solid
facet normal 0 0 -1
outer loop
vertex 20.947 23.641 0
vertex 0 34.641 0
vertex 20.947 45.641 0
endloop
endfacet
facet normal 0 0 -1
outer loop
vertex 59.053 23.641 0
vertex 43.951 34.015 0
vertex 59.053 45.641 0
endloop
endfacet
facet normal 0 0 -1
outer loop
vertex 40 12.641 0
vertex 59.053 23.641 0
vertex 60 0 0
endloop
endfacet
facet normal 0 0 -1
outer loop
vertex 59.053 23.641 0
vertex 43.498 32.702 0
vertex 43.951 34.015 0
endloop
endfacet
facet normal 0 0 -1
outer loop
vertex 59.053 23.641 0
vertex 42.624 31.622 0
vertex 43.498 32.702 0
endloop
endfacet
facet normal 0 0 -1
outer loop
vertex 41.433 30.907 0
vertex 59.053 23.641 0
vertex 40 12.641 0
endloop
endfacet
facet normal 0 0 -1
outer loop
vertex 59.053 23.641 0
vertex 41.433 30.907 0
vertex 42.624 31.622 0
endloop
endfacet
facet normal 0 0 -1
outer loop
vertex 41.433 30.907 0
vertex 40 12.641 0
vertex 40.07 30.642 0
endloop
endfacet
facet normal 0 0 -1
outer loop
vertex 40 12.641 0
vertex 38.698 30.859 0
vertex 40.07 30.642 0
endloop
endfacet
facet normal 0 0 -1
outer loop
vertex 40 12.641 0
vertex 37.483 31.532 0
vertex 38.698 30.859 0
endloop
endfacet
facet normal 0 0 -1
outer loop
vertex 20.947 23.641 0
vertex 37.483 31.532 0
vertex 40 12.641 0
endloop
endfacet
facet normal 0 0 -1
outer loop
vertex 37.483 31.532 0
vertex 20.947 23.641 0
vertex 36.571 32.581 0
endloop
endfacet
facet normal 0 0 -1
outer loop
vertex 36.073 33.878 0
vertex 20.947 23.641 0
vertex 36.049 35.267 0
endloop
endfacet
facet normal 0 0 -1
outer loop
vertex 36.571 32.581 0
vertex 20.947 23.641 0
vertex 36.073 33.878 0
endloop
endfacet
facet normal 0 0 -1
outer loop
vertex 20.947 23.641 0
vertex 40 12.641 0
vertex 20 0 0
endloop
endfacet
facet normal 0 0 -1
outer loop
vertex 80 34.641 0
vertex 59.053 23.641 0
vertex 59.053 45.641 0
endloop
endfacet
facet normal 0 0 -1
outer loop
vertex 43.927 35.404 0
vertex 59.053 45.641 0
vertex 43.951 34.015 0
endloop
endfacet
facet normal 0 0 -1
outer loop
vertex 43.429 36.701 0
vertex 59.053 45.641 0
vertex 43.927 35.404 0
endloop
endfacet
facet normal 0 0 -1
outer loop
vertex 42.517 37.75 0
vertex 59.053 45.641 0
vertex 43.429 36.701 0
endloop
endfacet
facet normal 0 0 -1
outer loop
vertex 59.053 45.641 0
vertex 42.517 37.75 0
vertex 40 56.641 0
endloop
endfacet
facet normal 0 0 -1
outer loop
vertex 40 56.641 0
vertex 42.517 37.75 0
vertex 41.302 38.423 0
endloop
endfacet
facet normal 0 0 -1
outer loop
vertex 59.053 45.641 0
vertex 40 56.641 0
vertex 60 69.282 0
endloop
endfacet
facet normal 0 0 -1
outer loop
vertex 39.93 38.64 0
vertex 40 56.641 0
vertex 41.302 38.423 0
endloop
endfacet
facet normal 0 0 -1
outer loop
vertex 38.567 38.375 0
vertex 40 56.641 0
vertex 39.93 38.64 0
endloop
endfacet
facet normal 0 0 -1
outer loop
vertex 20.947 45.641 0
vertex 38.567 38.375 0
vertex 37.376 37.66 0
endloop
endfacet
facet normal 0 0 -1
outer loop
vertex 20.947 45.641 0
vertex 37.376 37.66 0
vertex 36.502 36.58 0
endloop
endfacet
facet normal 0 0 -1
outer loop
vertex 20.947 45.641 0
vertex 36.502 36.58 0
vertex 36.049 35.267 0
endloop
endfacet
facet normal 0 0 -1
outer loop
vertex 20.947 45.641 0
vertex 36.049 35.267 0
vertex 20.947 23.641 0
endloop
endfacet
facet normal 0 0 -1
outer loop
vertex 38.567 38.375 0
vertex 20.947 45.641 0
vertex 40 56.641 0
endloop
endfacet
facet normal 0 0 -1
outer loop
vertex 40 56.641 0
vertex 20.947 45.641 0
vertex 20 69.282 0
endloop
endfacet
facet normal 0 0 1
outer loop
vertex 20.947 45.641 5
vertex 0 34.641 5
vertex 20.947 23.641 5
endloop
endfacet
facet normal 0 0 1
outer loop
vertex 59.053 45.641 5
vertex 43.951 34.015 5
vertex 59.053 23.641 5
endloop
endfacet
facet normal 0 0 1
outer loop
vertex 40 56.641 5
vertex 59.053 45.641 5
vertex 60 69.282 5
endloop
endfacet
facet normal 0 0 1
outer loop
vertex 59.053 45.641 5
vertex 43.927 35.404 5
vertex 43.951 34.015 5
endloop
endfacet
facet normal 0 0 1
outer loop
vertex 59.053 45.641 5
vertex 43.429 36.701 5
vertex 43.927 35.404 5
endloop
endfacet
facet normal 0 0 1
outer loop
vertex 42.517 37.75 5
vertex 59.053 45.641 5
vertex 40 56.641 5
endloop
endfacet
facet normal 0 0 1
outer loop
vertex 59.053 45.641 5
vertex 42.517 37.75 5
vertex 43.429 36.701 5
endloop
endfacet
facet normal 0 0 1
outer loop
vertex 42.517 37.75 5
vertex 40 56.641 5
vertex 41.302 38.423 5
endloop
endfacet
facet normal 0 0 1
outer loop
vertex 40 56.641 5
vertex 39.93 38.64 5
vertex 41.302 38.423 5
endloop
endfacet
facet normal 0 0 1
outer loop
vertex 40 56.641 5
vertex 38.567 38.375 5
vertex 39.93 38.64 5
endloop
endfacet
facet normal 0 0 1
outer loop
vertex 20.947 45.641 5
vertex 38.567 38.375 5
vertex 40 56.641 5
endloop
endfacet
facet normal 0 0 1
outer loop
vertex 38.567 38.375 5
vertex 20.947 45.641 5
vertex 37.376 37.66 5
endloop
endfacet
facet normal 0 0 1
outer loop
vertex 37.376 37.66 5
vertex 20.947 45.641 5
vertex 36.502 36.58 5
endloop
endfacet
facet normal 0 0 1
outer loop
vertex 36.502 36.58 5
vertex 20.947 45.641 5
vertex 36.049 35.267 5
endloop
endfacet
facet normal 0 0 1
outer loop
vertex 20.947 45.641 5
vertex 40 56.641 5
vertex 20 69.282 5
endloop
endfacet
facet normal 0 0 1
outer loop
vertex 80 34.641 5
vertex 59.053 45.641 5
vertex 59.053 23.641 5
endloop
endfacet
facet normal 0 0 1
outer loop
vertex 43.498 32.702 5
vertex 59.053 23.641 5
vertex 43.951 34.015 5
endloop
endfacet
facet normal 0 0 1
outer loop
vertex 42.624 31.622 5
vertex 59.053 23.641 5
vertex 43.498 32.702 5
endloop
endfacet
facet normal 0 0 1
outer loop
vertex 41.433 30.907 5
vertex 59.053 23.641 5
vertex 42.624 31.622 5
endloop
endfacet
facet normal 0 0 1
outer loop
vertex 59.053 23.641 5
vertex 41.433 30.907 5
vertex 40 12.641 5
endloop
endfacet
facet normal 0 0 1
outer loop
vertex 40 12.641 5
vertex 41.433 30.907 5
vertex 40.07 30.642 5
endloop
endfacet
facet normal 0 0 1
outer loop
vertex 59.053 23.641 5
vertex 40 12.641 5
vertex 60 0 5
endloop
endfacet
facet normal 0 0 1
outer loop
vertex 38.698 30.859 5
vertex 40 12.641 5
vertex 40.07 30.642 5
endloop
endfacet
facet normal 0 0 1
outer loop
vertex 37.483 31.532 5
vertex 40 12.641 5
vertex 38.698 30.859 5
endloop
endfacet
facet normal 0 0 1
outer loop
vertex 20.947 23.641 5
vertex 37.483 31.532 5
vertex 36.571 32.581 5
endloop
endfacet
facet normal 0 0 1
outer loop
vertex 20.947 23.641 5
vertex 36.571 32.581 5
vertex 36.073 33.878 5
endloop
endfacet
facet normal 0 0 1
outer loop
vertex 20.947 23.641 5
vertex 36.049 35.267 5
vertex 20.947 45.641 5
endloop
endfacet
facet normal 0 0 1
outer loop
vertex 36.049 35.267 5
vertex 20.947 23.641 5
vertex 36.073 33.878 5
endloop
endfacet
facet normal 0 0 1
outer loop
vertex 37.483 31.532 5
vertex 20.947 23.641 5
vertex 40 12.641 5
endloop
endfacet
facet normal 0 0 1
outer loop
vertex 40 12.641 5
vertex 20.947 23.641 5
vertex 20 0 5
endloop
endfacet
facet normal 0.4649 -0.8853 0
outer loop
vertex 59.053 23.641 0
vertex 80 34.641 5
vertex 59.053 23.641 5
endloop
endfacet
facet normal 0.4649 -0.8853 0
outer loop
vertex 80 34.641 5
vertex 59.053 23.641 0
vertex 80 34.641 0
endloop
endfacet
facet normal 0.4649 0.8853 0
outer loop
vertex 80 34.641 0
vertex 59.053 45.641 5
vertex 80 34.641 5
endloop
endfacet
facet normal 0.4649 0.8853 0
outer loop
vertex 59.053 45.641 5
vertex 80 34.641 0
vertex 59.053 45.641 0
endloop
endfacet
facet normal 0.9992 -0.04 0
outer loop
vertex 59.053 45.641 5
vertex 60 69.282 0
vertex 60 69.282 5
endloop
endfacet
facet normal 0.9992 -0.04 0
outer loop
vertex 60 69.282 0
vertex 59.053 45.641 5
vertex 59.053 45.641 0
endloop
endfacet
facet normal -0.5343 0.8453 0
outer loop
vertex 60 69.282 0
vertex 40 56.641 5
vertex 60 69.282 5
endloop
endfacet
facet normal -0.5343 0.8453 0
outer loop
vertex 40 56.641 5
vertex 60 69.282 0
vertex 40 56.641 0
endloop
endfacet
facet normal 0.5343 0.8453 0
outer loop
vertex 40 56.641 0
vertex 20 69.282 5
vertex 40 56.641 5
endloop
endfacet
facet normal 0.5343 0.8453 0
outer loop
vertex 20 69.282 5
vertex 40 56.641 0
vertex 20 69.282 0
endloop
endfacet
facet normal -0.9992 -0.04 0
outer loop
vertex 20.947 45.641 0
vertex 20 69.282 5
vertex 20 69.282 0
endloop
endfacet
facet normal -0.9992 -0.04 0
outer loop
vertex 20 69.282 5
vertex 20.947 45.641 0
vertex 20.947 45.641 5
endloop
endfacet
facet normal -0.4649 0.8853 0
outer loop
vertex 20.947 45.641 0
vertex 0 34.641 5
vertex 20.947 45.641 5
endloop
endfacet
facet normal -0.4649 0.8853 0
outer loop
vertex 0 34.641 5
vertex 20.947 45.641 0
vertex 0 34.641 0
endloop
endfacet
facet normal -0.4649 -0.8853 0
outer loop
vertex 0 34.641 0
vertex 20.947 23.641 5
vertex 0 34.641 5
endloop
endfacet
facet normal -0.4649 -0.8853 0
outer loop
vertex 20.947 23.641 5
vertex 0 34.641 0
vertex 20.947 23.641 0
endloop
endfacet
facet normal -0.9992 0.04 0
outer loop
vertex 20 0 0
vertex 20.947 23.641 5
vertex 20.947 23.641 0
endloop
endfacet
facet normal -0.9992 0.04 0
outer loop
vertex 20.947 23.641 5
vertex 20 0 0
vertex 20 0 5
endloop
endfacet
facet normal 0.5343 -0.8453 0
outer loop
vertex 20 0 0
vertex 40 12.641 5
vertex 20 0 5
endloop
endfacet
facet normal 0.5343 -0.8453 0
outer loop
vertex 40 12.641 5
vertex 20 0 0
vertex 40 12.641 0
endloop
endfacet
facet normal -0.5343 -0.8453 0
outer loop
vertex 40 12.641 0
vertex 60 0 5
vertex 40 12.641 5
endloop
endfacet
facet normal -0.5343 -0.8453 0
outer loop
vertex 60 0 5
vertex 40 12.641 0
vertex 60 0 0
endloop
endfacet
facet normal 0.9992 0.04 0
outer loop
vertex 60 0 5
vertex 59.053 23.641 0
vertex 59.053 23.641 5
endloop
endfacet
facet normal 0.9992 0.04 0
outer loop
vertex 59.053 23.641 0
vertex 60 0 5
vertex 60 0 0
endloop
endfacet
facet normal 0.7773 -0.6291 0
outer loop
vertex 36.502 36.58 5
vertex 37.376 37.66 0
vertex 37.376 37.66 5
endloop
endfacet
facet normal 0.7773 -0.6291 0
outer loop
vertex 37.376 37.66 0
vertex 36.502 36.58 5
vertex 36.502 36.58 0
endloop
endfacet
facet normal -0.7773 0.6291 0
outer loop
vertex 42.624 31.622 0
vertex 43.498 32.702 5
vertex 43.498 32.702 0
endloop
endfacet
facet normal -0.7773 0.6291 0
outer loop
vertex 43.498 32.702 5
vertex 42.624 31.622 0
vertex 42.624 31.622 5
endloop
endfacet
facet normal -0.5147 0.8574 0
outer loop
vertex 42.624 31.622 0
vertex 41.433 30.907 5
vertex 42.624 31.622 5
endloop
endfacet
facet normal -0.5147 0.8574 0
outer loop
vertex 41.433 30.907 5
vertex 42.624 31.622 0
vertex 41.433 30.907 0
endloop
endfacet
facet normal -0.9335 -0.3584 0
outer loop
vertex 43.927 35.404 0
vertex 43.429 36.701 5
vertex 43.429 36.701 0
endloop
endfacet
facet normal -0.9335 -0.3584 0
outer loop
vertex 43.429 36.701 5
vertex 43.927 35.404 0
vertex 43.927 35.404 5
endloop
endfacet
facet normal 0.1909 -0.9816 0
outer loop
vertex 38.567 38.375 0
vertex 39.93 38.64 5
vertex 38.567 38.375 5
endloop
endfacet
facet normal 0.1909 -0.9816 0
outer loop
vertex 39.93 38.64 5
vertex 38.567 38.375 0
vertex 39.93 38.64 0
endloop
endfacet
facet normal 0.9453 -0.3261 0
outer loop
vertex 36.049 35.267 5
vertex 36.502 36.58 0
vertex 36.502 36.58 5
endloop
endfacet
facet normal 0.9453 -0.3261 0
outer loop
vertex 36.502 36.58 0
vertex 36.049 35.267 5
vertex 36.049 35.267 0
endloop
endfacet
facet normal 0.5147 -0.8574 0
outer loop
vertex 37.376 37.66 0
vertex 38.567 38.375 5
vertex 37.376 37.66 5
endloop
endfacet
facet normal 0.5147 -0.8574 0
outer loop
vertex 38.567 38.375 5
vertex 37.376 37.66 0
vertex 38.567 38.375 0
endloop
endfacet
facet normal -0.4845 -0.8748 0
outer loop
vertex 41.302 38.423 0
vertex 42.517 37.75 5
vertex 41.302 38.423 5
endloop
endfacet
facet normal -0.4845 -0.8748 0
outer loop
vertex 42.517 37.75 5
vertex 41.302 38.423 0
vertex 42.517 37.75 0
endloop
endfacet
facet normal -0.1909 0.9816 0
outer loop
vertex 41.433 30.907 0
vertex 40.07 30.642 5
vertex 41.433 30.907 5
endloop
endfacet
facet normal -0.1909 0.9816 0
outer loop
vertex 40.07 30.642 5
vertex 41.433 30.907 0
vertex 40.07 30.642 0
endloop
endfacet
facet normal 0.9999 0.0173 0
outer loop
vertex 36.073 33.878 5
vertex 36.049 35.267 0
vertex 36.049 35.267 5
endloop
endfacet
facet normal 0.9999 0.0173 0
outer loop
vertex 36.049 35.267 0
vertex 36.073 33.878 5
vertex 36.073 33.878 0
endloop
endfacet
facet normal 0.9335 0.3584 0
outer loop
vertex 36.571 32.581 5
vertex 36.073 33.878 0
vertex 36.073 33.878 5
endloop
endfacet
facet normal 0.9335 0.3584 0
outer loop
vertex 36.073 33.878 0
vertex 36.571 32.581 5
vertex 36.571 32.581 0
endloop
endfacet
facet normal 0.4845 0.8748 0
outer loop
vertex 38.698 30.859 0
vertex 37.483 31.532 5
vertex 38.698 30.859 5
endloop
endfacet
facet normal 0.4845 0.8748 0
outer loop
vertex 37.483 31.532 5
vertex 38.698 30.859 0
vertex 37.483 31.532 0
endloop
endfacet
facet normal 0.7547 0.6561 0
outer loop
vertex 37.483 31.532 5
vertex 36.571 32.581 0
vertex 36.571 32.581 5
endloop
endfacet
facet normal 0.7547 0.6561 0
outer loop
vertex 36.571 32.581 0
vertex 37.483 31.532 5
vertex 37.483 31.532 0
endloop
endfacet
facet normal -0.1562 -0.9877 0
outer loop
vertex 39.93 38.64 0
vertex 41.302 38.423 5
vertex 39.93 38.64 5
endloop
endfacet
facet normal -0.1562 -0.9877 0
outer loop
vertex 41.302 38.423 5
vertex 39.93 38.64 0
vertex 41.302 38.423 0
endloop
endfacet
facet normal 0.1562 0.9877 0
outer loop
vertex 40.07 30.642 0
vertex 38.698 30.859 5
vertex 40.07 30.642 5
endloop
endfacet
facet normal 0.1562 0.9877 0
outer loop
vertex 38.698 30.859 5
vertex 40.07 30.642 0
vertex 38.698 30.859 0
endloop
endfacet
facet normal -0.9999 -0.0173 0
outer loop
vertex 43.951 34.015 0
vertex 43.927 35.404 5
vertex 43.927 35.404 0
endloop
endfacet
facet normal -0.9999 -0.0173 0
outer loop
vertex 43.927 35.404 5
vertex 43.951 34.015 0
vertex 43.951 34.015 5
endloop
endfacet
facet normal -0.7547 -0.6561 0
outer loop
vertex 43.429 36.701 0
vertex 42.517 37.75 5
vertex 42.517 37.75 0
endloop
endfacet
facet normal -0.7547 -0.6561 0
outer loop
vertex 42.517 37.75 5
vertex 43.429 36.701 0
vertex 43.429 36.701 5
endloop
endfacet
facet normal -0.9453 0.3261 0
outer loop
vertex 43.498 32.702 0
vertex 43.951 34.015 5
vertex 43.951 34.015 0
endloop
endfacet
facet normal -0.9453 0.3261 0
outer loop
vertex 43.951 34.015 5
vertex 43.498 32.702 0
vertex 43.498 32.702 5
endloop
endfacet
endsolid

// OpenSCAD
$fn = 32;

// ----------------------------------------------------------------------
// Star wheel: 6-point star, R40
// ----------------------------------------------------------------------

// --- parameters (mm) ---
n_points = 6;             // number of points / teeth
r_out = 40;               // tip radius
r_in = 22;                // root radius
bore_r = 4;               // centre bore radius
plate_t = 5;              // plate thickness, Z (extrusion height)
bore_d = 8;               // centre bore diameter

profile = [[80, 34.641], [59.053, 45.641], [60, 69.282], [40, 56.641], [20, 69.282], [20.947, 45.641], [0, 34.641], [20.947, 23.641], [20, 0], [40, 12.641], [60, 0], [59.053, 23.641]];  // primary outline, 12 points, counter clockwise
void_1 = [[43.927, 35.404], [43.429, 36.701], [42.517, 37.75], [41.302, 38.423], [39.93, 38.64], [38.567, 38.375], [37.376, 37.66], [36.502, 36.58], [36.049, 35.267], [36.073, 33.878], [36.571, 32.581], [37.483, 31.532], [38.698, 30.859], [40.07, 30.642], [41.433, 30.907], [42.624, 31.622], [43.498, 32.702], [43.951, 34.015]];  // centre bore, 18 points

// --- the one profile operation ---
difference() {
  linear_extrude(height = plate_t) polygon(points = profile);
  translate([0, 0, -1])
    linear_extrude(height = plate_t + 2) polygon(points = void_1);
}
